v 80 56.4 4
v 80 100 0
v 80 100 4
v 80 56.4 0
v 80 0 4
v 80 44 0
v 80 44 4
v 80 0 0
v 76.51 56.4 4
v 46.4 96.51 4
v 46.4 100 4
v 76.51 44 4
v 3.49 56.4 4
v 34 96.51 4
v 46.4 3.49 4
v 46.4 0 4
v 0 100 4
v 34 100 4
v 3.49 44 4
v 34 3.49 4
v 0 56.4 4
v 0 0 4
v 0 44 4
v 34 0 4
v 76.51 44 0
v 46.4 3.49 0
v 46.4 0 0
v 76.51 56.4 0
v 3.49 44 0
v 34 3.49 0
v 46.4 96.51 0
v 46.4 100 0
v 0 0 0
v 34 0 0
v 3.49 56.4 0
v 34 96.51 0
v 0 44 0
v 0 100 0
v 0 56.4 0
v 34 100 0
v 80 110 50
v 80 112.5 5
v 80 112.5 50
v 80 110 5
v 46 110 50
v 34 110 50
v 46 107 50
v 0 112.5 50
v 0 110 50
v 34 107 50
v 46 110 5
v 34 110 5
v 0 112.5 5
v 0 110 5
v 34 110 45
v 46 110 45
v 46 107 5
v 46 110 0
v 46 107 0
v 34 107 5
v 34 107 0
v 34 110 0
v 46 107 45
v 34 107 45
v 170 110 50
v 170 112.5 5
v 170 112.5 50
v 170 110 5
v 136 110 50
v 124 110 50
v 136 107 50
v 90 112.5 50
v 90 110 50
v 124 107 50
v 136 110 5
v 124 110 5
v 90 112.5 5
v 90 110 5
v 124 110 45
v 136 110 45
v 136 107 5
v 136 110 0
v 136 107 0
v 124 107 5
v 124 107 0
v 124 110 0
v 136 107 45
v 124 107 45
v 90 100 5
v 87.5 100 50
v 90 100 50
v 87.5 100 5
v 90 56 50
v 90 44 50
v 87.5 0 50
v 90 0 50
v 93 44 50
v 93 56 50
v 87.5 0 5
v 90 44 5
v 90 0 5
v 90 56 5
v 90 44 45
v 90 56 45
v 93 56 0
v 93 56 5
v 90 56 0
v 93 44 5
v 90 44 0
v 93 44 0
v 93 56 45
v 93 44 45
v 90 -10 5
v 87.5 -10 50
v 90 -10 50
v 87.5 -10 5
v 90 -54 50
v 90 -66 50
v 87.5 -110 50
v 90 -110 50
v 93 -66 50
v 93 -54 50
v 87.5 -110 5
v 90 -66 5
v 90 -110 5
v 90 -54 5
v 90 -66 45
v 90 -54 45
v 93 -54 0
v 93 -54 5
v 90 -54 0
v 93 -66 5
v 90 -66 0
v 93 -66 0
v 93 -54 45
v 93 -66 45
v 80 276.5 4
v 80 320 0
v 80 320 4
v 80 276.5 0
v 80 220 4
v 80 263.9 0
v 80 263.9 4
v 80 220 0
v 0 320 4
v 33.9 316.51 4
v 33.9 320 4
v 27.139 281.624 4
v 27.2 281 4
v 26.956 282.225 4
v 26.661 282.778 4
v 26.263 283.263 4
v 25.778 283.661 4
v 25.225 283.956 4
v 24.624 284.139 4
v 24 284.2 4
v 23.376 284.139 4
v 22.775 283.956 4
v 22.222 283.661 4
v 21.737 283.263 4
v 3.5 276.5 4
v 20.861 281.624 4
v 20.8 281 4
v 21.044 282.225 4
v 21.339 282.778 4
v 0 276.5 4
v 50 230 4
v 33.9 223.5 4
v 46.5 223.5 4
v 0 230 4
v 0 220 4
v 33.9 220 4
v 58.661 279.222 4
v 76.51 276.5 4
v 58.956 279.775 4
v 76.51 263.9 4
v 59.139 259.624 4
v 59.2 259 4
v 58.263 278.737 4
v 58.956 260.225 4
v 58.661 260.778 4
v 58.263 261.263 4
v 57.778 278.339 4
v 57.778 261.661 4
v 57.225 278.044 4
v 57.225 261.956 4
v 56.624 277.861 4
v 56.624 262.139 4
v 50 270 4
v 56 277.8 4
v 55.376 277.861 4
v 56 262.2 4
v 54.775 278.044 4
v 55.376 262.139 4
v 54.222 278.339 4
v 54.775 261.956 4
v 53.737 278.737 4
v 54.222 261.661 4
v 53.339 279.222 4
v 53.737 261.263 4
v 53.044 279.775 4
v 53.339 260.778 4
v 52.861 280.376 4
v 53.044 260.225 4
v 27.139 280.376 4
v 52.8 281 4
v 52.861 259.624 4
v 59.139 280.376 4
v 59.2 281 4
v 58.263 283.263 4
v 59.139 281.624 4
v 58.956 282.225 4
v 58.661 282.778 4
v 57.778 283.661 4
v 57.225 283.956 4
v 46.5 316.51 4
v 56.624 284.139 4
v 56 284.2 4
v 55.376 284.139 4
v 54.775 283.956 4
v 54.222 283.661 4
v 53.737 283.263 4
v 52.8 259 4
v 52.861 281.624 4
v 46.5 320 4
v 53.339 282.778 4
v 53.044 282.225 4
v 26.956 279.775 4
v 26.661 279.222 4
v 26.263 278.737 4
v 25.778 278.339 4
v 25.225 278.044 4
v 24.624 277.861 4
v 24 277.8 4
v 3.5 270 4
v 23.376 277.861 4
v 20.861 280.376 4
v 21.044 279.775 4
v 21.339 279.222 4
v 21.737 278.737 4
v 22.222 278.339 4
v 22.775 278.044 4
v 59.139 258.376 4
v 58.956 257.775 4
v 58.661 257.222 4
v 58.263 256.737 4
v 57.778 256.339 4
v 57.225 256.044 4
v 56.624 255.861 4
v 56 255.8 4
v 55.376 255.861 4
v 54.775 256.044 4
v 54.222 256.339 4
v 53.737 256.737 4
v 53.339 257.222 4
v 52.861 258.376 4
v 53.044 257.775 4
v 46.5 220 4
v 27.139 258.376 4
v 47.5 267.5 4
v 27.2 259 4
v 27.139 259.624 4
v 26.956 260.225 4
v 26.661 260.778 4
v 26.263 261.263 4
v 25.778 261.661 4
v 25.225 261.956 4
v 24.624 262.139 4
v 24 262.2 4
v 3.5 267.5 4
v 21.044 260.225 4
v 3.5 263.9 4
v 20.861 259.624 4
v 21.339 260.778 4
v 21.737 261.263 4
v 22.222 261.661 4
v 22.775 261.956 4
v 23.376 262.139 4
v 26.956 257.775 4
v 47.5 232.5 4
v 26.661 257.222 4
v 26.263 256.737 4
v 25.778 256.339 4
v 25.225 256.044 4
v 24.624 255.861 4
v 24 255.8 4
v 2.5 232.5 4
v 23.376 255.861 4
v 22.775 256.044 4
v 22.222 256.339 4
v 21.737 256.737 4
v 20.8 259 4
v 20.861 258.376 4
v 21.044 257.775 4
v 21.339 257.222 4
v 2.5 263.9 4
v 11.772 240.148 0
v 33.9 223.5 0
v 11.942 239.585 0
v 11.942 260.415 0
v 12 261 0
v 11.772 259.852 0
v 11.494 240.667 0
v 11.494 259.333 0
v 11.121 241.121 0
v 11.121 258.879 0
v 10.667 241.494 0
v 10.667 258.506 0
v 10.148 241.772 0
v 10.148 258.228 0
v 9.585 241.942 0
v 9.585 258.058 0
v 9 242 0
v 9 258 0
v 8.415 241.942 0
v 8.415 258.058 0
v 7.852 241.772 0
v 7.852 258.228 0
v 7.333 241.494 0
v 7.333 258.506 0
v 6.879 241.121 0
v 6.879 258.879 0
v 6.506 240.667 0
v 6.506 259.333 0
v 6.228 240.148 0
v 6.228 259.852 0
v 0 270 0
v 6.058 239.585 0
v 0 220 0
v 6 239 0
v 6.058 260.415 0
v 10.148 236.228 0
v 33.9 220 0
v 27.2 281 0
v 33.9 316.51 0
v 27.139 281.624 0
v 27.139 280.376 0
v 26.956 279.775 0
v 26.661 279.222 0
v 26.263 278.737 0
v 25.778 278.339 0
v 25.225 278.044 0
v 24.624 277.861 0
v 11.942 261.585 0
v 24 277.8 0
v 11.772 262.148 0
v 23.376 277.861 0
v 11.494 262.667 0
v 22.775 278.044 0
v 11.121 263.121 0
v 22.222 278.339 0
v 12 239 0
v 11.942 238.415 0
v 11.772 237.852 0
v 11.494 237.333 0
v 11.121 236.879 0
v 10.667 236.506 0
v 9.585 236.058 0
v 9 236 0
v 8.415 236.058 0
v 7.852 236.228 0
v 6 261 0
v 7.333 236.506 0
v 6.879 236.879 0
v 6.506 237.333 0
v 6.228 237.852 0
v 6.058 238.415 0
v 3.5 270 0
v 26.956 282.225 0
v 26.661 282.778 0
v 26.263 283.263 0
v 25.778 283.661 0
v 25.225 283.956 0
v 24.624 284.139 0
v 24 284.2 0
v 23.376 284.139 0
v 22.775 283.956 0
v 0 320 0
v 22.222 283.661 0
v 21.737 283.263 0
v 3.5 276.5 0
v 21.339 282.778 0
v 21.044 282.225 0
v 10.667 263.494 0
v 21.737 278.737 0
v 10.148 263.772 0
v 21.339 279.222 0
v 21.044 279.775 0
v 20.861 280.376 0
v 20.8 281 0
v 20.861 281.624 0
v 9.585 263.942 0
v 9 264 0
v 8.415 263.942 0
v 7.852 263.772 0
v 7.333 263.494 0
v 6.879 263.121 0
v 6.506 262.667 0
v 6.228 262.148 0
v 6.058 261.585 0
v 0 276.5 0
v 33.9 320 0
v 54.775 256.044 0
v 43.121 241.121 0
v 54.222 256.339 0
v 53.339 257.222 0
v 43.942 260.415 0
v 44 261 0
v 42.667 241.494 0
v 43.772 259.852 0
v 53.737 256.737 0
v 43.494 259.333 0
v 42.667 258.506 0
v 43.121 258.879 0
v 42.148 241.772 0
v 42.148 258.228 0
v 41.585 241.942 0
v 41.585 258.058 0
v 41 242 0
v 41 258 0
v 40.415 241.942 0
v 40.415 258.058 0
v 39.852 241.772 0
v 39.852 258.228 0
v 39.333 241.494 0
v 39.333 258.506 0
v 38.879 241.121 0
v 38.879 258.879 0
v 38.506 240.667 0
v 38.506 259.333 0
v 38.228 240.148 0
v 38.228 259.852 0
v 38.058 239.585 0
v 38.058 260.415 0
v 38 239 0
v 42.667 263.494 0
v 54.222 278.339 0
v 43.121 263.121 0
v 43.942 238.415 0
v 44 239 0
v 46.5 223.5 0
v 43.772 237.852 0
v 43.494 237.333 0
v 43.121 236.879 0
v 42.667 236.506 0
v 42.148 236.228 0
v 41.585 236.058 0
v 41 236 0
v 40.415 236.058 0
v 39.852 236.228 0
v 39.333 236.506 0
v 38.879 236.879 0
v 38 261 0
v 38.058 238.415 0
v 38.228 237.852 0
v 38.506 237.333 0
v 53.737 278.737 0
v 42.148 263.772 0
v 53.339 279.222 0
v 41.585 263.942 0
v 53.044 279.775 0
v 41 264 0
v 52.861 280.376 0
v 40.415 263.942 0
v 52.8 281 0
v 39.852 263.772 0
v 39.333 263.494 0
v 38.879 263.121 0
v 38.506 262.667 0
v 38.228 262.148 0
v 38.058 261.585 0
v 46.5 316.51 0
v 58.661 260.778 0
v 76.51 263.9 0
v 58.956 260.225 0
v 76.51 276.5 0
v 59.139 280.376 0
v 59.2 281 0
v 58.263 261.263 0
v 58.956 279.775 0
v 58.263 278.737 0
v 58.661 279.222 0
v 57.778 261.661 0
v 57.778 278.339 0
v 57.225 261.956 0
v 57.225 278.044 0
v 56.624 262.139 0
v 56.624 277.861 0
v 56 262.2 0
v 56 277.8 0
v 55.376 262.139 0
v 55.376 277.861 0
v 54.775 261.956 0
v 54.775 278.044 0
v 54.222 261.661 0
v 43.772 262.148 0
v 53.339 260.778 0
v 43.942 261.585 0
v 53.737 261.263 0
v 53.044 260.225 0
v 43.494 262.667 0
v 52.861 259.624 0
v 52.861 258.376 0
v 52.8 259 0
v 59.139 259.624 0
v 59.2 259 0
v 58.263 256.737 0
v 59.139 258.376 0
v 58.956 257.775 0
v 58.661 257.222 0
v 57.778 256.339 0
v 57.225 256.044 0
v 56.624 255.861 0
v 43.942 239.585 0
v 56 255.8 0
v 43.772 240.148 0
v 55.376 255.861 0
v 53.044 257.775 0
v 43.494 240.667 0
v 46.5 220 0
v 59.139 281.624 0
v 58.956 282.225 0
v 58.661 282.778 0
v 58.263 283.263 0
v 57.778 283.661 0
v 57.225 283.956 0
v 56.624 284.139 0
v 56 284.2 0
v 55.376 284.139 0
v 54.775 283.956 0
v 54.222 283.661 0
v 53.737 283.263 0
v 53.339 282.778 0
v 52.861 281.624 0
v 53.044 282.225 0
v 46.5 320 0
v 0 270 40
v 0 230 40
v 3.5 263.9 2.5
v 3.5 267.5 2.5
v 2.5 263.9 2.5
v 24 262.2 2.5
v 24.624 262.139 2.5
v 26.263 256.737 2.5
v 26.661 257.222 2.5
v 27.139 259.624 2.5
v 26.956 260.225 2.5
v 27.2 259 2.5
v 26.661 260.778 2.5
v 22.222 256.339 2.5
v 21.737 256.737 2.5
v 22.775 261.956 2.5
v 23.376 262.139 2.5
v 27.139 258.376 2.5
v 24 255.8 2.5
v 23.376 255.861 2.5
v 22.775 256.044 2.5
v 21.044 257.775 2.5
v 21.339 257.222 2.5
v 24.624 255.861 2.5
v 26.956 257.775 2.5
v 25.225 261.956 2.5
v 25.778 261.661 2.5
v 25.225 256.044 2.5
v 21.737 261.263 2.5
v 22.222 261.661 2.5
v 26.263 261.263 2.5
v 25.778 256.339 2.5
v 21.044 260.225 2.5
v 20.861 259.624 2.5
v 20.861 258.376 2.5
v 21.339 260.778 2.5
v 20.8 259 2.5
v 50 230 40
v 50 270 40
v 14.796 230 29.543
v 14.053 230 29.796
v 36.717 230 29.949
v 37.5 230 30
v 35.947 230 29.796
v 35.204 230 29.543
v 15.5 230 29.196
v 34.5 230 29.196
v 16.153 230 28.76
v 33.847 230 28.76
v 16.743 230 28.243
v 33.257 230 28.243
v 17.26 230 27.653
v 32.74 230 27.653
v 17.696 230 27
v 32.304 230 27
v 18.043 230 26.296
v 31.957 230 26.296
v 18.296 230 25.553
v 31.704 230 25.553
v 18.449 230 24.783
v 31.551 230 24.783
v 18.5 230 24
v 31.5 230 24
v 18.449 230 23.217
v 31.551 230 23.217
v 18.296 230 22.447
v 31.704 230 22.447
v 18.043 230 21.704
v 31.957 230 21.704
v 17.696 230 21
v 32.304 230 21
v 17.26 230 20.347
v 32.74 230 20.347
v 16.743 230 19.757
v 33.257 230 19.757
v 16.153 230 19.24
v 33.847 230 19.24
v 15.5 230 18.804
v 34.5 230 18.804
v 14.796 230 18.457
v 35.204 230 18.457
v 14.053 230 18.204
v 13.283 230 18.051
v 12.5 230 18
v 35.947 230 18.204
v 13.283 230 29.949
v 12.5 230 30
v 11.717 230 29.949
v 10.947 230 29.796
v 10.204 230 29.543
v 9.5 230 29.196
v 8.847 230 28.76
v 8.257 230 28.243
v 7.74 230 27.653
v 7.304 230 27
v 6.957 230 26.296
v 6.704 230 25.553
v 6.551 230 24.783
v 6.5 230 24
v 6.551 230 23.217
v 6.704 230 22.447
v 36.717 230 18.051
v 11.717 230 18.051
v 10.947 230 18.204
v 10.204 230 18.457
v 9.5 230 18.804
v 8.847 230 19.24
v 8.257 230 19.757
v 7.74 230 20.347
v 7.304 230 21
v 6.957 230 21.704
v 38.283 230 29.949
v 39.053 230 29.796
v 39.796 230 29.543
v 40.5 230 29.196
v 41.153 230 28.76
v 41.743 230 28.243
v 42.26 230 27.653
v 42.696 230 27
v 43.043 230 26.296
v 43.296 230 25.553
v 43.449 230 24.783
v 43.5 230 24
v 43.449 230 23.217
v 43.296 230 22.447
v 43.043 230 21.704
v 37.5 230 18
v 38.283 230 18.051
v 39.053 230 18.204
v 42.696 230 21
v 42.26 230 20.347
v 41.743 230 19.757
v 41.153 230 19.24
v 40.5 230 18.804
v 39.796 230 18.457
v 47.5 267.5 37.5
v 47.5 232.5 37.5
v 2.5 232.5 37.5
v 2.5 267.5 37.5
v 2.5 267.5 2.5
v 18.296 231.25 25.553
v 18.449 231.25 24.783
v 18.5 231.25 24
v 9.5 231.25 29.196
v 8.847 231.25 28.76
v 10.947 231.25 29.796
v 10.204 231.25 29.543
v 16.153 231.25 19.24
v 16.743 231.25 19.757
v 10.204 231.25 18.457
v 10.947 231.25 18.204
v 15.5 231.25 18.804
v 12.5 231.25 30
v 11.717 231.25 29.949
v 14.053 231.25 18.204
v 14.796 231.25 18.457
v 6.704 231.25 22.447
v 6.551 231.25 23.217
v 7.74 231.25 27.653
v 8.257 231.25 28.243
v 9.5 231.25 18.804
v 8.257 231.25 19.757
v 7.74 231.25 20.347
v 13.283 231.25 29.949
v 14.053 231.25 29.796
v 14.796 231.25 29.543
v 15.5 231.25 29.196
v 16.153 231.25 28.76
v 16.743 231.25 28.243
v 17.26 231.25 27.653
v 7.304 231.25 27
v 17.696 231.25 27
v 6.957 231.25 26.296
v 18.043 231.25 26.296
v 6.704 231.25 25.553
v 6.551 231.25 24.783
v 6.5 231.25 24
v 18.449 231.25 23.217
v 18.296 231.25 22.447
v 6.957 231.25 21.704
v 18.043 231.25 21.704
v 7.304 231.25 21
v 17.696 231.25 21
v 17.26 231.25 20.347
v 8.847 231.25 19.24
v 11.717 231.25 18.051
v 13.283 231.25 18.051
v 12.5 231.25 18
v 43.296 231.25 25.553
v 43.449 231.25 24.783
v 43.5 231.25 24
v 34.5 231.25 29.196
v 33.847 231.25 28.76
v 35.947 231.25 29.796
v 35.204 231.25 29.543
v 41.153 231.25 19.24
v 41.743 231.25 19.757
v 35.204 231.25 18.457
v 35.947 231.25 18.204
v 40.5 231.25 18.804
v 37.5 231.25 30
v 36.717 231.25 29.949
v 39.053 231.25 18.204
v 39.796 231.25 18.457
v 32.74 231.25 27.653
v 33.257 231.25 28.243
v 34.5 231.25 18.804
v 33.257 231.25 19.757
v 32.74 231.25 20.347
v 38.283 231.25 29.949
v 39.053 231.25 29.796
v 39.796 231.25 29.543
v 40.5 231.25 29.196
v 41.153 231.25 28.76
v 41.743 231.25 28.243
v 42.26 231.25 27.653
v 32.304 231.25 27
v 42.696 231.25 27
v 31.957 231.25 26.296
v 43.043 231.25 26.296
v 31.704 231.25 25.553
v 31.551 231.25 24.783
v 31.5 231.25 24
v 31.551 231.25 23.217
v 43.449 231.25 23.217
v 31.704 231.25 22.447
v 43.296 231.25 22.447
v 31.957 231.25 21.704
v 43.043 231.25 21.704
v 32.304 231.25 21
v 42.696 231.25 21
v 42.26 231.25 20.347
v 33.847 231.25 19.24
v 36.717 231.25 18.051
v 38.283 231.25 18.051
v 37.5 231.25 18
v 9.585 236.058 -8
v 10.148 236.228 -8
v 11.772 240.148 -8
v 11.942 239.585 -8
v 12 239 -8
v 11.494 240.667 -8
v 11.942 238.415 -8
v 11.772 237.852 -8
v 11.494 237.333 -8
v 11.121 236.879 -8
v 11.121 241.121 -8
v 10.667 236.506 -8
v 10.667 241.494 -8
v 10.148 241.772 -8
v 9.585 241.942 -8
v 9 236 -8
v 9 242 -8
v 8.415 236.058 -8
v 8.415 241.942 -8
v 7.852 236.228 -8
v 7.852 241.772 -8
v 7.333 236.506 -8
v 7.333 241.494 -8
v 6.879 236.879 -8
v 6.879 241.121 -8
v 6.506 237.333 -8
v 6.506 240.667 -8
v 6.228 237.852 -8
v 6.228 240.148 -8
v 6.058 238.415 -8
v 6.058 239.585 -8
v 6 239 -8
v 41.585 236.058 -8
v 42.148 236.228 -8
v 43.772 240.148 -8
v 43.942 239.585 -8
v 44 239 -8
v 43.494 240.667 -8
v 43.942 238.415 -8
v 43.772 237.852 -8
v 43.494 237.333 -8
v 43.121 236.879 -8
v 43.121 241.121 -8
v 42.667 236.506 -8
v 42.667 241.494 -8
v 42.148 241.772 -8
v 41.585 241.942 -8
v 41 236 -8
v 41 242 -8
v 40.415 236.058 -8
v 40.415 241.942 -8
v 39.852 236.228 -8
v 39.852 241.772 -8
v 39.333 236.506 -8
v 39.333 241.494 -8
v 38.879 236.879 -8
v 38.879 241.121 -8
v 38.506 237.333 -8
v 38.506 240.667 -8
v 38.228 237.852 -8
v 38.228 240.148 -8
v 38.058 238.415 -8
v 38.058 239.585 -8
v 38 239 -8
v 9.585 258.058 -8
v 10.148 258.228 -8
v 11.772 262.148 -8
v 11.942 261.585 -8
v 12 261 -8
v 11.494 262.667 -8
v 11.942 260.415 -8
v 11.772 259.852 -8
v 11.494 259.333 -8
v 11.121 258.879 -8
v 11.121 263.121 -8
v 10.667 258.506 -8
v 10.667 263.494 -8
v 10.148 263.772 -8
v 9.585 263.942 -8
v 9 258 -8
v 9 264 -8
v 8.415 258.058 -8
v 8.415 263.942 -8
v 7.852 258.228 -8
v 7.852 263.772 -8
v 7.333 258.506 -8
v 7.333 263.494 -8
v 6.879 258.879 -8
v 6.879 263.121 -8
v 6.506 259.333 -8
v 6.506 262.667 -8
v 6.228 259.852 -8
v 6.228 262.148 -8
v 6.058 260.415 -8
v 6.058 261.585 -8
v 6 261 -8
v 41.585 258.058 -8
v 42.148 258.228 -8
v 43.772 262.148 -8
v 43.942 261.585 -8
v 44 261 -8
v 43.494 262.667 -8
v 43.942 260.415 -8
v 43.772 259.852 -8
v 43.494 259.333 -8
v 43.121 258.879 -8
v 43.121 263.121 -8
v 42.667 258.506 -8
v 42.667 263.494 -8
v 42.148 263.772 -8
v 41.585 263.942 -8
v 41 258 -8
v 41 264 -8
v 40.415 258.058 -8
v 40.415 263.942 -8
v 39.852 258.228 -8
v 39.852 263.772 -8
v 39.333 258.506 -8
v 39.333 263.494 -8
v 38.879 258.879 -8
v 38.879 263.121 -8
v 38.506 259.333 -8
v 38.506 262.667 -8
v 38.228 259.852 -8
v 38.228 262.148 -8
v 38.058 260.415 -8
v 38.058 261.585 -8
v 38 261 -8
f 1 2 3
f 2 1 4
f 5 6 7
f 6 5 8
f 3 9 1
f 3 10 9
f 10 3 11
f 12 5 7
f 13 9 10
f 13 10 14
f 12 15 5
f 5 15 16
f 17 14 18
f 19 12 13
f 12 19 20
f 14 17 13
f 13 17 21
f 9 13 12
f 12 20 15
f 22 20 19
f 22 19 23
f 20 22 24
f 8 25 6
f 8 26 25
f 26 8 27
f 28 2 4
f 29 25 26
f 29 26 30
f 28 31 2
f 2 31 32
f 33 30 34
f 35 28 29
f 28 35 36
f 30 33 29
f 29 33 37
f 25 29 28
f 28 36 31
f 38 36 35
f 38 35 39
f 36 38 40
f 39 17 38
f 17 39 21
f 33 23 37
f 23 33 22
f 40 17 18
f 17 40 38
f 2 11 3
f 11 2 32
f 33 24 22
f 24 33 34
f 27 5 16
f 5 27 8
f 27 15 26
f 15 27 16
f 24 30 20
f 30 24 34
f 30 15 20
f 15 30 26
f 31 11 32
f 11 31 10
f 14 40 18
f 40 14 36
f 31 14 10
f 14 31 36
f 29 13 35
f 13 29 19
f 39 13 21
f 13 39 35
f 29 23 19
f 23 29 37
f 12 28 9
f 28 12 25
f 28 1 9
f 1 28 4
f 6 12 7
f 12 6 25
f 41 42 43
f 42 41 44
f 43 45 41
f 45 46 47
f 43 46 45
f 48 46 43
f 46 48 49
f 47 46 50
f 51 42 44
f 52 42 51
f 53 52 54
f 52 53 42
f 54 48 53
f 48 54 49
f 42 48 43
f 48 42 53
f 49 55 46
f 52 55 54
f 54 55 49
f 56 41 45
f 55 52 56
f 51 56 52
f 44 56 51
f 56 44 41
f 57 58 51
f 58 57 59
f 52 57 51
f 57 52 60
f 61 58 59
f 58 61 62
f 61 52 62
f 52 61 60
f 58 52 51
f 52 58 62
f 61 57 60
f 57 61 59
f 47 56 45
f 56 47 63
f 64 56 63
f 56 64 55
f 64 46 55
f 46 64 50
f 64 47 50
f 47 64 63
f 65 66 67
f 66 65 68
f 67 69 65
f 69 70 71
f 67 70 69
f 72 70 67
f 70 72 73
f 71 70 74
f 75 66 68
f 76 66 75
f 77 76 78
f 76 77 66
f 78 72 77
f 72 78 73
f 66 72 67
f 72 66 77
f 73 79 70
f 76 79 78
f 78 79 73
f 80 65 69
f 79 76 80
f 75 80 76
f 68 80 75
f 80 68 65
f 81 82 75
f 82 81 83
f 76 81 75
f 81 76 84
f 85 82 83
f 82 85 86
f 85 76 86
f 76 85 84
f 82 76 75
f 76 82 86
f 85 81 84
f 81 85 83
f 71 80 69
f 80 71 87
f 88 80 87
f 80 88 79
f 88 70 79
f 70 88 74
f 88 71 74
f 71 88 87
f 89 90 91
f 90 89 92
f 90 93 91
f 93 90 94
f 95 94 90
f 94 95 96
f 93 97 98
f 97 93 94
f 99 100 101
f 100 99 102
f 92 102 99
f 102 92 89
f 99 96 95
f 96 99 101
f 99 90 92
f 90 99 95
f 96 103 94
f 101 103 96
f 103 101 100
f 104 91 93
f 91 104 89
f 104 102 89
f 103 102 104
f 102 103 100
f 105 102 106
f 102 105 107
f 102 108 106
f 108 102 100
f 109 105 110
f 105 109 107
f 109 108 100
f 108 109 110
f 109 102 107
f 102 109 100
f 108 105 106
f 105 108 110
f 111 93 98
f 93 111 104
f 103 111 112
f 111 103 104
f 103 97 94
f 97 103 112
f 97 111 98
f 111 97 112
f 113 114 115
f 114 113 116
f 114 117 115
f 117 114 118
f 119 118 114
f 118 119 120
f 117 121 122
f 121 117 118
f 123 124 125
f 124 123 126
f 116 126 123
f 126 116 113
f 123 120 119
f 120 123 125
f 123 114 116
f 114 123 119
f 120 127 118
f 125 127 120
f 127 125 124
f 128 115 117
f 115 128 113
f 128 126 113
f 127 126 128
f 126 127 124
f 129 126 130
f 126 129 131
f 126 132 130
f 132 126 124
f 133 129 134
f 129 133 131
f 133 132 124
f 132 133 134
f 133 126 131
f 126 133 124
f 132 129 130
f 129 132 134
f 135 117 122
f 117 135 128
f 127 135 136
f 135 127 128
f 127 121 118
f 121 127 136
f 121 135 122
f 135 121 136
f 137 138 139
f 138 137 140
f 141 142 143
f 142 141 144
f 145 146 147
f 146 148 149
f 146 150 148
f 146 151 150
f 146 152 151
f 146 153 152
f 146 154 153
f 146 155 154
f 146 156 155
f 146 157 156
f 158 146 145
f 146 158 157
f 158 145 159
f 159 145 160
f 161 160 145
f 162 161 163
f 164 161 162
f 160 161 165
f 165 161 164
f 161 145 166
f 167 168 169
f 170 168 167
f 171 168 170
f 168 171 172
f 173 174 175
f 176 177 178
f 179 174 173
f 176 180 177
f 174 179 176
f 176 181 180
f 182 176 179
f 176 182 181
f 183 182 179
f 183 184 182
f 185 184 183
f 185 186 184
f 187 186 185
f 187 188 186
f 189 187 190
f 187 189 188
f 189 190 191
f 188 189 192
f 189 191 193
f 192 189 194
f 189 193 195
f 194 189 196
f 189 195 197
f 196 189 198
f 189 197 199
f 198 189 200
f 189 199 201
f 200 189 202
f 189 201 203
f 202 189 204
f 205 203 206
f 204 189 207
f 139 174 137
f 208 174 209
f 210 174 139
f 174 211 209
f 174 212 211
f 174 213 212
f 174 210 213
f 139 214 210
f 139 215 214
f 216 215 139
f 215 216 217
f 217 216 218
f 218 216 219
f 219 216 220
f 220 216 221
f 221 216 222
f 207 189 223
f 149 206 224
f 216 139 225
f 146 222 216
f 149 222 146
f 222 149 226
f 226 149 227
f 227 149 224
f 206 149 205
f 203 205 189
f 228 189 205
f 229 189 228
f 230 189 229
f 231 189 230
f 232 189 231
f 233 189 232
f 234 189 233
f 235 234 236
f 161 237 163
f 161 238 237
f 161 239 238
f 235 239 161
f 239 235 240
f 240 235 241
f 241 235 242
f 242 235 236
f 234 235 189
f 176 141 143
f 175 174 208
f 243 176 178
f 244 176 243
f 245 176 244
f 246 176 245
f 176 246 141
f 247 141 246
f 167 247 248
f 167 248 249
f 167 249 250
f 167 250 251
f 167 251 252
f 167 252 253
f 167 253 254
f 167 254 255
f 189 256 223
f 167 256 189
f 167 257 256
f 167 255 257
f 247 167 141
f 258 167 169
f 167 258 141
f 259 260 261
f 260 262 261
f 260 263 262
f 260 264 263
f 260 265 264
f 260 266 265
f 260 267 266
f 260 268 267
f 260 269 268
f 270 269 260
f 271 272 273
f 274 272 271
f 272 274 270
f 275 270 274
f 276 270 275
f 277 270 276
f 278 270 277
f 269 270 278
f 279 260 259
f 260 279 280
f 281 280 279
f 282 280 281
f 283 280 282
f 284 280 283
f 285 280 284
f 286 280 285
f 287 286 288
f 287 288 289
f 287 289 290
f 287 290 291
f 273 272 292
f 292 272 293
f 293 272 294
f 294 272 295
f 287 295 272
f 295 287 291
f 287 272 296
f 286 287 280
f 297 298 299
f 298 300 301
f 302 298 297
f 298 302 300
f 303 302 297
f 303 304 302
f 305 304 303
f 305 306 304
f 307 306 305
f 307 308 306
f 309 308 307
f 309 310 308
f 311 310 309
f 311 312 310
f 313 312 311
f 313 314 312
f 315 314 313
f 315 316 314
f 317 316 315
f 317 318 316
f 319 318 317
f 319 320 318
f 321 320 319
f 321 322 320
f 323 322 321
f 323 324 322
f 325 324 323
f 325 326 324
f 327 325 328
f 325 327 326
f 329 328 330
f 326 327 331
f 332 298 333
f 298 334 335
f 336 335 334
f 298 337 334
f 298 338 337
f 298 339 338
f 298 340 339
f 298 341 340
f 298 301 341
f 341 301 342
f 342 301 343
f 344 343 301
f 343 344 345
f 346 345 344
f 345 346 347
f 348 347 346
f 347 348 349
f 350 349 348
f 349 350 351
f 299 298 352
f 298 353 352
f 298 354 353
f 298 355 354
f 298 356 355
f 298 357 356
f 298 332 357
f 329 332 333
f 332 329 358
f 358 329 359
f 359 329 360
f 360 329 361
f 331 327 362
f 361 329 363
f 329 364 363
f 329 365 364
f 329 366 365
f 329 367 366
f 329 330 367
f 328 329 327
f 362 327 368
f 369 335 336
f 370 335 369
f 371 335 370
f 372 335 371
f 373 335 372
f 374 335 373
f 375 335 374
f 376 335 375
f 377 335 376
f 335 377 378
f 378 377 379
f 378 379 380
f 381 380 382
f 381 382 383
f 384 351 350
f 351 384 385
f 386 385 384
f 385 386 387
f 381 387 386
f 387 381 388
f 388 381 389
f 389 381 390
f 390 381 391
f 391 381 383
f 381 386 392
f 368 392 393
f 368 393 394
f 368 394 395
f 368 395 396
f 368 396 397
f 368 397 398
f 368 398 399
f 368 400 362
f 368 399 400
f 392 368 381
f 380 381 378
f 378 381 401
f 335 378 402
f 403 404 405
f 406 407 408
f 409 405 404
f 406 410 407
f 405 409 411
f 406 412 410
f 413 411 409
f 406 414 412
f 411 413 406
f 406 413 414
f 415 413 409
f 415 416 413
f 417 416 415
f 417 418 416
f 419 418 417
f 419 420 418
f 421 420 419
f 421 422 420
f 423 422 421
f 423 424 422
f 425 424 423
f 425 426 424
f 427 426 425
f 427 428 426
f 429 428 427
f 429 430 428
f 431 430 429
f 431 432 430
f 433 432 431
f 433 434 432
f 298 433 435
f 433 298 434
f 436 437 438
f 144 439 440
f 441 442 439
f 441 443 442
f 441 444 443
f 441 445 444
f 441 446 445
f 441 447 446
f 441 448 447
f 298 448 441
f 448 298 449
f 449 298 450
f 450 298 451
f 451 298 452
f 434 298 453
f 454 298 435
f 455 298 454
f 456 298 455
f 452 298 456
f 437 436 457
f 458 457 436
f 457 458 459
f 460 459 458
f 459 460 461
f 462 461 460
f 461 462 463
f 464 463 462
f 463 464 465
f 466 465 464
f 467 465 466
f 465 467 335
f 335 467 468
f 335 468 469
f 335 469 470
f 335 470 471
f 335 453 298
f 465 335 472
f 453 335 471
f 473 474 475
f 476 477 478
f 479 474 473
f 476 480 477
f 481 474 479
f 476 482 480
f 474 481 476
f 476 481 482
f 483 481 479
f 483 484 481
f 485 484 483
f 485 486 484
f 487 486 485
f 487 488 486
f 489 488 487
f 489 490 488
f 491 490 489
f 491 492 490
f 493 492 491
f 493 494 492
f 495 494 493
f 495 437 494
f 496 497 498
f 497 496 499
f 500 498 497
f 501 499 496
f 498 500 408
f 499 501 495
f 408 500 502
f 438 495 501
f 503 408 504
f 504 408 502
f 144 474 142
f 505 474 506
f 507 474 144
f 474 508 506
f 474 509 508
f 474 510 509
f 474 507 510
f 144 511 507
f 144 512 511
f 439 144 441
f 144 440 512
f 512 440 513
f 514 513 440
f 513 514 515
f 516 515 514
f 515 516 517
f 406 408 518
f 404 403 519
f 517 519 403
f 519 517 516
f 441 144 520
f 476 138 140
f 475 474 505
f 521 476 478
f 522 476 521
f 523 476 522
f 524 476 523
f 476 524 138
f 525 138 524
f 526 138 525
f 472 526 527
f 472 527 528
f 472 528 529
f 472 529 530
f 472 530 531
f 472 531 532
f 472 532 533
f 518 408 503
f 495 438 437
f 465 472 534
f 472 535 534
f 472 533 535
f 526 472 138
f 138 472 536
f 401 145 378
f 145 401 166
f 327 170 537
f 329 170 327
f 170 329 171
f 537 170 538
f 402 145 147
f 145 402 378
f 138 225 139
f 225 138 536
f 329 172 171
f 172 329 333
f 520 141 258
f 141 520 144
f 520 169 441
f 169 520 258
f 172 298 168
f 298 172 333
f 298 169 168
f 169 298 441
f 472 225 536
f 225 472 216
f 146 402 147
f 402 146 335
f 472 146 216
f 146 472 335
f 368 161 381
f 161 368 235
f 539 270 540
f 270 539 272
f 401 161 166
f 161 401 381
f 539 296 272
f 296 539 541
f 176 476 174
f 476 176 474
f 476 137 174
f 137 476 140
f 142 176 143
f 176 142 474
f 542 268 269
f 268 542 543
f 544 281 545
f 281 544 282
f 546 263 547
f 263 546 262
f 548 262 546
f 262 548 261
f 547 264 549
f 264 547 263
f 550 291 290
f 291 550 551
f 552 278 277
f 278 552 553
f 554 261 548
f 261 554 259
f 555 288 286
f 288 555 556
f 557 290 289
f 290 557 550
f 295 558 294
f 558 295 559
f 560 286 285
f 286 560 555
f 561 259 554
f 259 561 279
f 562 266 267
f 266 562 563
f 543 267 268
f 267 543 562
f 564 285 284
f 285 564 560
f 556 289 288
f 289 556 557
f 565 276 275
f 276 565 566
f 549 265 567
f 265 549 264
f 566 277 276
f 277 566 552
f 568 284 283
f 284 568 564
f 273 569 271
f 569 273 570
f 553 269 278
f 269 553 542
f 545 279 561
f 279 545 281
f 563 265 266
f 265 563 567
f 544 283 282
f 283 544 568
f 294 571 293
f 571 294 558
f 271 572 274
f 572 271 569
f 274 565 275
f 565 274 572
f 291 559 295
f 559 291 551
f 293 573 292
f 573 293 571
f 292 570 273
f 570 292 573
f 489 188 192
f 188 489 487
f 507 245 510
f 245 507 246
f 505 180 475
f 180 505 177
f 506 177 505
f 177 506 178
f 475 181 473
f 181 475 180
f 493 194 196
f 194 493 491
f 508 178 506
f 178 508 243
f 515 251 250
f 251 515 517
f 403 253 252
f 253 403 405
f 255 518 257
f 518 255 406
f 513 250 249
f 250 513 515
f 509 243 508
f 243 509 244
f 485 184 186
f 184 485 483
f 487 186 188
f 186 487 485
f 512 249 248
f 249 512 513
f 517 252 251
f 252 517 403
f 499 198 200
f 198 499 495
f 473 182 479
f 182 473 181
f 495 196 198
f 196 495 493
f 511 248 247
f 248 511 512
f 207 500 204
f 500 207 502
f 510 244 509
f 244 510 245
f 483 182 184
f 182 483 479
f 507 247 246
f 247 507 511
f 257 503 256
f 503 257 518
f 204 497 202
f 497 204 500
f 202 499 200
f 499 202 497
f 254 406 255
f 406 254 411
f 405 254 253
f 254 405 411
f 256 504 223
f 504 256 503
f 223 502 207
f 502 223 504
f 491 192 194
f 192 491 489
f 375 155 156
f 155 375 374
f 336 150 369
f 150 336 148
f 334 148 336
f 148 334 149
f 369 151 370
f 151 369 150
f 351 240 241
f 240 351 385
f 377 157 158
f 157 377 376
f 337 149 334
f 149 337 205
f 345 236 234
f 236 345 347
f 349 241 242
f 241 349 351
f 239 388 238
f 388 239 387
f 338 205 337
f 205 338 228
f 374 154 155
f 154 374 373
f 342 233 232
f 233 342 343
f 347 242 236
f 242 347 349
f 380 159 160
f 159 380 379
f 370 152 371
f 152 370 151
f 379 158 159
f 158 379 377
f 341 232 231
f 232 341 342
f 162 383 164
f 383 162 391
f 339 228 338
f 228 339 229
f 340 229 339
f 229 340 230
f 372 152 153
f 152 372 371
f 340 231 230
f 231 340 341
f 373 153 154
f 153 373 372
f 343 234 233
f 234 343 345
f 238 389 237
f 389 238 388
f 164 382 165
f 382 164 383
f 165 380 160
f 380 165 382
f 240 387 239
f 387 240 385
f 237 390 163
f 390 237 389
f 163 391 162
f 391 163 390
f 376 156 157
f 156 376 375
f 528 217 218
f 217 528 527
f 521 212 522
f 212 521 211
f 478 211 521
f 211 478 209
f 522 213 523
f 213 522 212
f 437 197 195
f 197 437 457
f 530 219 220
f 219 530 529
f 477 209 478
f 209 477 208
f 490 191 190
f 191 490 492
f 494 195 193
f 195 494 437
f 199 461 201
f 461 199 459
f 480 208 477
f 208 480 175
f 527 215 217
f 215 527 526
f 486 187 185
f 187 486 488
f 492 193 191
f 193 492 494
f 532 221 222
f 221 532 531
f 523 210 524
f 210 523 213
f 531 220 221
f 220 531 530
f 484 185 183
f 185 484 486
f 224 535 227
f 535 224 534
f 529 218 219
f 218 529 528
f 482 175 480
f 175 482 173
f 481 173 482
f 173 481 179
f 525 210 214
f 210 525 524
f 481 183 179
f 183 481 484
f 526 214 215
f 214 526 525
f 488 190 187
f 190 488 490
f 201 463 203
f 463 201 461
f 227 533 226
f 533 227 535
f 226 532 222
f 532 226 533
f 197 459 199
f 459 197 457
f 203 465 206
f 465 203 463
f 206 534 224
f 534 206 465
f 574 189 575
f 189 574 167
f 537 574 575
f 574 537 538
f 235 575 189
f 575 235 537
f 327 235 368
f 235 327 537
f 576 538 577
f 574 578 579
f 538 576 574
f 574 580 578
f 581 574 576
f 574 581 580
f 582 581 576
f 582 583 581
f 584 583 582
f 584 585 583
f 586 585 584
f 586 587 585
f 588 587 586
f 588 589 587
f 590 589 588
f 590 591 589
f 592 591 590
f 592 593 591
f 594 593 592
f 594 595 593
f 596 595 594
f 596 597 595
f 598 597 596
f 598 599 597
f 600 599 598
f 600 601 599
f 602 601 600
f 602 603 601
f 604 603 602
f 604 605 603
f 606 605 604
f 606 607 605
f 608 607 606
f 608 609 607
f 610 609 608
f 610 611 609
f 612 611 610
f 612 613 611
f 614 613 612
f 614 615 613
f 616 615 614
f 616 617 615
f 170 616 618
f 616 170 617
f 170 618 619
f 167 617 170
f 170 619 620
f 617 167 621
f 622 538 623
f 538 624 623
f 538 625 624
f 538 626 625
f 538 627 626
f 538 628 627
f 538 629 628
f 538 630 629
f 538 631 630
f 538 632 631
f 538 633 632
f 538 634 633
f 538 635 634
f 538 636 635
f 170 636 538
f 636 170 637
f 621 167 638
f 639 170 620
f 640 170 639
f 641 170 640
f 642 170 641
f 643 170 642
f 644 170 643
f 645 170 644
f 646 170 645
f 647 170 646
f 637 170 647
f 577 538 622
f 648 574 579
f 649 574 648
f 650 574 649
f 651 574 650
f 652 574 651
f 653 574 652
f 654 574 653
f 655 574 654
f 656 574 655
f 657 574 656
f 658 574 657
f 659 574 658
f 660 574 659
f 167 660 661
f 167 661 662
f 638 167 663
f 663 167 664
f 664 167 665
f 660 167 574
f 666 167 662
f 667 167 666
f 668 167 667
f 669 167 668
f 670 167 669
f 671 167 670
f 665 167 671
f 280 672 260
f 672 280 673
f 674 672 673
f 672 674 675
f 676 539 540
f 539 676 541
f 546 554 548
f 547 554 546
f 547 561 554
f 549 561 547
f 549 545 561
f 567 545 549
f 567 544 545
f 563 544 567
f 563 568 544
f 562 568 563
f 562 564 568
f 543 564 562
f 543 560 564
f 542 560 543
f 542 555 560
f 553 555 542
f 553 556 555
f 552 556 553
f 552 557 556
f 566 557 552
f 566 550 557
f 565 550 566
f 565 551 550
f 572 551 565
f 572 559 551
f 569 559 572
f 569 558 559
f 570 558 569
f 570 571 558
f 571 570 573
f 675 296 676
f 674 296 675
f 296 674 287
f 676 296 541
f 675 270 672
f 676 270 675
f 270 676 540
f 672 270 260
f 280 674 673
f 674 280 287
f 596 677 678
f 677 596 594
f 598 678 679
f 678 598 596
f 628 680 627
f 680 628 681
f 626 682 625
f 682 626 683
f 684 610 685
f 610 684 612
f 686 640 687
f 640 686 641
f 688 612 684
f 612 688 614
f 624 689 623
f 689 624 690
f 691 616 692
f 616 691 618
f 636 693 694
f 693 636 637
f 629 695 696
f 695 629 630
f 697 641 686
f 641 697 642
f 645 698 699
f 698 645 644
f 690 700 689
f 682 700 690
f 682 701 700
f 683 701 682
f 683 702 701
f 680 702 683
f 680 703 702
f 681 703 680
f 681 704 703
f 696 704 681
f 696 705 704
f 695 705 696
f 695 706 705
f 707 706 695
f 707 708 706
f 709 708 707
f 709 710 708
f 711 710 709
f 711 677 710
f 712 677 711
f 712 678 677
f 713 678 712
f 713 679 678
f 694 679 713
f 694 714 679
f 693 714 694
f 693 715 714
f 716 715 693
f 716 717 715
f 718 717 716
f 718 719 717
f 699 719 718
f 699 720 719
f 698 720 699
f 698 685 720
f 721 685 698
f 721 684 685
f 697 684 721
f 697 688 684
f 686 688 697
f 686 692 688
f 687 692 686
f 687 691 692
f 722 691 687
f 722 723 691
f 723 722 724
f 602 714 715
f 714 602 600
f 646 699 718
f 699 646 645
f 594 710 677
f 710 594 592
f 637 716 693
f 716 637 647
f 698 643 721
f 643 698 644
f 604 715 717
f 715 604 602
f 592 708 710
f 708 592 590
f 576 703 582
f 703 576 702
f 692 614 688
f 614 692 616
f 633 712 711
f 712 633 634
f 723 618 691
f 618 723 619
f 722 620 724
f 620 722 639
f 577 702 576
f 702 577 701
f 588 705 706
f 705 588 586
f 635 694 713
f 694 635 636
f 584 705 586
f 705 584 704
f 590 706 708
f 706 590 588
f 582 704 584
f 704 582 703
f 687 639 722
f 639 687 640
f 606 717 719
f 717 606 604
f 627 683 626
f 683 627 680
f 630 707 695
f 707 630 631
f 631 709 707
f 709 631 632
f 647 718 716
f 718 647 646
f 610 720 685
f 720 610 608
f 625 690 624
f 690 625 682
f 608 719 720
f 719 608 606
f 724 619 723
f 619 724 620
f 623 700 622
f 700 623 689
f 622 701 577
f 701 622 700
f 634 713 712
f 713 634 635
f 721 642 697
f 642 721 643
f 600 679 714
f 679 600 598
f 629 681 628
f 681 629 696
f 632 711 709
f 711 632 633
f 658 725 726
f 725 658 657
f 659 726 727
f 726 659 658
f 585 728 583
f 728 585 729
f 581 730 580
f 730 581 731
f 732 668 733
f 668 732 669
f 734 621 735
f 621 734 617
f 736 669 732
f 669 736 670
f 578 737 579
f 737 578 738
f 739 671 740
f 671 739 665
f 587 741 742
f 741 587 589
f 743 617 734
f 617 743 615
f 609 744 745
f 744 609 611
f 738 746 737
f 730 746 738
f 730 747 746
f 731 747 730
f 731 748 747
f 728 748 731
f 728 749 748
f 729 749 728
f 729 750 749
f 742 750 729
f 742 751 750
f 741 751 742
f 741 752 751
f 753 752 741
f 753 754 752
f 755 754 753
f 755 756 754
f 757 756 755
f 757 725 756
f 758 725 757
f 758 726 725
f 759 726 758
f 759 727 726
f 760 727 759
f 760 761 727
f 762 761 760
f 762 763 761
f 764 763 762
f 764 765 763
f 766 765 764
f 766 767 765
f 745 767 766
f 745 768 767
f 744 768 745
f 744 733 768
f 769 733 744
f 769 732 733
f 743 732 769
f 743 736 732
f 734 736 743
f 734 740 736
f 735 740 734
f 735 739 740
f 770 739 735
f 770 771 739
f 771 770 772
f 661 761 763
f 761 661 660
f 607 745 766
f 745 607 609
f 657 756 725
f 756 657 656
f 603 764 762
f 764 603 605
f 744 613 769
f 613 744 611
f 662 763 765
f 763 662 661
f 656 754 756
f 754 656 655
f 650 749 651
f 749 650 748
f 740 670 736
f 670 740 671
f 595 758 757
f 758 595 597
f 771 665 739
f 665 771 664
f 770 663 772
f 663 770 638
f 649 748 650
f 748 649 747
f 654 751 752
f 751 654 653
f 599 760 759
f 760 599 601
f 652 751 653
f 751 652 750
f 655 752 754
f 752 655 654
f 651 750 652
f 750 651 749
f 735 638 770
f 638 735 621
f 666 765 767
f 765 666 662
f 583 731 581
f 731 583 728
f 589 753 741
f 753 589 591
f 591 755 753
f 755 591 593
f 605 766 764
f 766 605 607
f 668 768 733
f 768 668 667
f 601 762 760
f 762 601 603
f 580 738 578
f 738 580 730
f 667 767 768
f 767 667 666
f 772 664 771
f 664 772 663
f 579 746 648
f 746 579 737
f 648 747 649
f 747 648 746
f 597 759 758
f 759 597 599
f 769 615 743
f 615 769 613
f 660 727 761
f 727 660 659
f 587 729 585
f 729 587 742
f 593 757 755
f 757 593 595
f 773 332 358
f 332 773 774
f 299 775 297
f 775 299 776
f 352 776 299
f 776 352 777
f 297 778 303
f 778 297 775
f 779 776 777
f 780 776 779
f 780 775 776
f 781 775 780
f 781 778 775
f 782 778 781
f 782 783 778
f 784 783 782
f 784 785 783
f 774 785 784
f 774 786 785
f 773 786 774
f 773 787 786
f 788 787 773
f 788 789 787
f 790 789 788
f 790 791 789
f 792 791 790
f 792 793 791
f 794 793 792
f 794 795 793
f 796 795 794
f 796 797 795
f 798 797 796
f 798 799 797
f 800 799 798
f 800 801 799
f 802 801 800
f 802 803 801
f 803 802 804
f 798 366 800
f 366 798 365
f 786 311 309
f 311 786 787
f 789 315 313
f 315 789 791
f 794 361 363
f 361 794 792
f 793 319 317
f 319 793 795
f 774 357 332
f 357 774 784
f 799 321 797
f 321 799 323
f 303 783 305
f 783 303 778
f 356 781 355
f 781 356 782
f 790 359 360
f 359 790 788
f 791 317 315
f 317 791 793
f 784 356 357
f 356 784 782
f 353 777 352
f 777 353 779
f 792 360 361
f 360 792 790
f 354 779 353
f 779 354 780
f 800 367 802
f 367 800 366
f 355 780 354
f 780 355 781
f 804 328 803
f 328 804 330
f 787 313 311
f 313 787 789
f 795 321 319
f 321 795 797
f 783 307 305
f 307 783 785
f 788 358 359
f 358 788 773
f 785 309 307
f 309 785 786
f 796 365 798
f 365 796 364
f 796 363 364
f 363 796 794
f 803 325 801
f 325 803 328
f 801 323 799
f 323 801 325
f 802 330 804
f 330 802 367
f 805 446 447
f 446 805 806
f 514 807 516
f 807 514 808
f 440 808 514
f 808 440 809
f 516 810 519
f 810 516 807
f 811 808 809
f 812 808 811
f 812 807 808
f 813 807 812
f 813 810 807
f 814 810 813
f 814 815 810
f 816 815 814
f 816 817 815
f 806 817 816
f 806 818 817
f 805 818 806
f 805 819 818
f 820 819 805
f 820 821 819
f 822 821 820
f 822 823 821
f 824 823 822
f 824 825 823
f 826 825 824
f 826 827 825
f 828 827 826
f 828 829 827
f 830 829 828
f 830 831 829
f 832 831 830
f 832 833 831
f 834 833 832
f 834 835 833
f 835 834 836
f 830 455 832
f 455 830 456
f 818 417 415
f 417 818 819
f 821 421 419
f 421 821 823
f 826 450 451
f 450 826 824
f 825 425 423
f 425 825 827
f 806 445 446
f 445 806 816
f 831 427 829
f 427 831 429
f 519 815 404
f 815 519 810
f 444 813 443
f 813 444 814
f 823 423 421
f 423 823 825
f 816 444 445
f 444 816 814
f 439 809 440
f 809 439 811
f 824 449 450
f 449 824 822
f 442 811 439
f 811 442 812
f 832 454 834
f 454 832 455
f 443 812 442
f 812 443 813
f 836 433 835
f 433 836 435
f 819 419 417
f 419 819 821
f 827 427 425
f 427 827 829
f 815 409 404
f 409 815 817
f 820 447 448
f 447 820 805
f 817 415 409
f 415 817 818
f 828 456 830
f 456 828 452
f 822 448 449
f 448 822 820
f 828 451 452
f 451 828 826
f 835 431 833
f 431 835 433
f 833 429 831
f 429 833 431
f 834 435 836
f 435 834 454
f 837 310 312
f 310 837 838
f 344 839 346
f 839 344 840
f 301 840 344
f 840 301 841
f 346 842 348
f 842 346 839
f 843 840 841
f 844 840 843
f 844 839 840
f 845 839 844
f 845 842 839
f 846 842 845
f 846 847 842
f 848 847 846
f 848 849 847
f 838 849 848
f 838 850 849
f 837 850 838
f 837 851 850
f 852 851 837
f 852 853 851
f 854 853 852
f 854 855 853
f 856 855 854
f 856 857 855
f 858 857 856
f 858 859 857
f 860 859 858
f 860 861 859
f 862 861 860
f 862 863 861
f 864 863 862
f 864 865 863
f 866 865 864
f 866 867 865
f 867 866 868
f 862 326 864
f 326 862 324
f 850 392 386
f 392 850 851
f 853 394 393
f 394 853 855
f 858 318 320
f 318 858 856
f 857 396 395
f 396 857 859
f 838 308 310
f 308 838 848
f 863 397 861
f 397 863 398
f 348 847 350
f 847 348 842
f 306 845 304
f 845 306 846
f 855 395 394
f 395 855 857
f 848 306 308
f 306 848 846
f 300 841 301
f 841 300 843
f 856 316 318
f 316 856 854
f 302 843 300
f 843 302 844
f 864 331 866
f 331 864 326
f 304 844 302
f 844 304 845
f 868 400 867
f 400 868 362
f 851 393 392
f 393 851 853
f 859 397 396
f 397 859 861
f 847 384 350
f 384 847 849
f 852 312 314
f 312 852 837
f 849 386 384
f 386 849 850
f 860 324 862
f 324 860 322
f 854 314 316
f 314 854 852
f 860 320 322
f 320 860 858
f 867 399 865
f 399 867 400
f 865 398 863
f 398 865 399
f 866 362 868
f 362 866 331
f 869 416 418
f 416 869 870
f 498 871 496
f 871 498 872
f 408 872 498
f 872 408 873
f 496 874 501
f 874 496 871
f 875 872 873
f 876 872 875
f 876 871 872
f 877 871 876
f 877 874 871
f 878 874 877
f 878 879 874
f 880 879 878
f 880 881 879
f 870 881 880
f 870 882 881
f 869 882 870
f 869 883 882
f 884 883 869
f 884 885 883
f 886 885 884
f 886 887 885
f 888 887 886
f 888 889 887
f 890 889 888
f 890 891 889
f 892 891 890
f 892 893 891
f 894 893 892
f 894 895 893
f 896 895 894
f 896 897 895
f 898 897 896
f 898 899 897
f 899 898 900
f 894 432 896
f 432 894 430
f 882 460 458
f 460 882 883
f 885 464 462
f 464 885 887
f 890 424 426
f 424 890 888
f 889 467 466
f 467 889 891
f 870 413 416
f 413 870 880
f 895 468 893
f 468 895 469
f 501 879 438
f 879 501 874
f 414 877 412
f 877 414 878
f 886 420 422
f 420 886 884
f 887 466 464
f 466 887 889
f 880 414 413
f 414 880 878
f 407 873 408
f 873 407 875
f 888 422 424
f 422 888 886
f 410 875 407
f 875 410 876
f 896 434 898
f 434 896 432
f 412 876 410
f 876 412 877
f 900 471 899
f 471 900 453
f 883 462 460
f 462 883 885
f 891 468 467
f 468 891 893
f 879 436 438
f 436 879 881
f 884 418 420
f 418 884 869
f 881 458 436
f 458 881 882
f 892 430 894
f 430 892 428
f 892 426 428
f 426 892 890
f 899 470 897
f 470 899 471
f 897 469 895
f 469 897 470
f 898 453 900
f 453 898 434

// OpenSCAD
// =========================
// Projeto Caelum - Montagem modular com encaixes
// Versão revisada: paredes agora têm TABS SUPERIORES
// =========================

// -------------------- CONFIG --------------------
wall = 2.5;
clearance = 0.4;
snap_gap = 0.2;

// Dimensões do corpo
body_x = 80;
body_y = 100;
body_z = 50;

// Cabeça
head_x = 50;
head_y = 40;
head_z = 40;

// Encaixes
tab_w = 12;
tab_h = 5;
tab_d = 3;

// Pinos da cabeça
peg_d = 6;
peg_h = 8;

// modos
view_mode =6;
// -------------------- HELPERS --------------------
function slot_len_for_wall_x() = body_x - 2*wall;
function slot_len_for_wall_y() = body_y - 2*wall;

// -------------------- BASE --------------------
module base_plate() {

    base_thickness = 4;
    pocket_depth = tab_h + 0.5;

    difference() {
        cube([body_x, body_y, base_thickness]);

        // front slot
        translate([wall + (slot_len_for_wall_x() - tab_w)/2, -0.01, 0])
            cube([tab_w + clearance, tab_d + 0.5, pocket_depth + 0.1]);

        // back slot
        translate([wall + (slot_len_for_wall_x() - tab_w)/2, body_y - (tab_d + 0.5) + 0.01, 0])
            cube([tab_w + clearance, tab_d + 0.5, pocket_depth + 0.1]);

        // left slot
        translate([-0.01, wall + (slot_len_for_wall_y() - tab_w)/2, 0])
            cube([tab_d + 0.5, tab_w + clearance, pocket_depth + 0.1]);

        // right slot
        translate([body_x - (tab_d + 0.5) + 0.01, wall + (slot_len_for_wall_y() - tab_w)/2, 0])
            cube([tab_d + 0.5, tab_w + clearance, pocket_depth + 0.1]);
    }
}

// -------------------- WALL FRONT/BACK --------------------
module wall_front_back() {

    height = body_z;
    width = body_x;
    thickness = wall;

    difference() {
        union() {
            // Corpo
            translate([0,0,tab_h])
                cube([width, thickness, height - tab_h]);

            // TAB inferior
            translate([(width - tab_w)/2, -tab_d, 0])
                cube([tab_w, tab_d, tab_h]);

            // TAB superior  (NOVO)
            translate([(width - tab_w)/2, -tab_d, height - tab_h])
                cube([tab_w, tab_d, tab_h]);
        }
    }
}

// -------------------- WALL LEFT/RIGHT --------------------
module wall_left_right() {

    height = body_z;
    width = body_y;
    thickness = wall;

    difference() {
        union() {
            translate([0,0,tab_h])
                cube([width, thickness, height - tab_h]);

            // TAB inferior
            translate([(width - tab_w)/2, -tab_d, 0])
                cube([tab_w, tab_d, tab_h]);

            // TAB superior (NOVO)
            translate([(width - tab_w)/2, -tab_d, height - tab_h])
                cube([tab_w, tab_d, tab_h]);
        }
    }
}

// -------------------- TOP PLATE --------------------
module top_plate() {

    top_thickness = 4;
    r_slot_len = tab_w + clearance + snap_gap;
    r_slot_depth = tab_d + 0.5;

    head_origin_x = (body_x - head_x) / 2;
    head_origin_y = (body_y - head_y) / 2;

    difference() {
        cube([body_x, body_y, top_thickness]);

        // front slot
        translate([wall + (slot_len_for_wall_x() - tab_w)/2 - snap_gap/2, 0, -0.01])
            cube([r_slot_len, r_slot_depth, top_thickness + 0.02]);

        // back slot
        translate([wall + (slot_len_for_wall_x() - tab_w)/2 - snap_gap/2,
                   body_y - r_slot_depth + 0.01, -0.01])
            cube([r_slot_len, r_slot_depth, top_thickness + 0.02]);

        // left slot
        translate([0,
                   wall + (slot_len_for_wall_y() - tab_w)/2 - snap_gap/2, -0.01])
            cube([r_slot_depth, r_slot_len, top_thickness + 0.02]);

        // right slot
        translate([body_x - r_slot_depth + 0.01,
                   wall + (slot_len_for_wall_y() - tab_w)/2 - snap_gap/2, -0.01])
            cube([r_slot_depth, r_slot_len, top_thickness + 0.02]);

        // ----------------------
        // FUROS PARA A CABEÇA
        // ----------------------

        hole_d = peg_d + clearance;
        hole_depth = peg_h + 1;
        inset = 6;

        hx1 = head_origin_x + inset + peg_d/2;
        hy1 = head_origin_y + inset + peg_d/2;

        hx2 = head_origin_x + head_x - inset - peg_d/2;
        hy2 = head_origin_y + inset + peg_d/2;

        hx3 = head_origin_x + inset + peg_d/2;
        hy3 = head_origin_y + head_y - inset - peg_d/2;

        hx4 = head_origin_x + head_x - inset - peg_d/2;
        hy4 = head_origin_y + head_y - inset - peg_d/2;

        translate([hx1, hy1, -0.01]) cylinder(h=hole_depth, r=hole_d/2, $fn=32);
        translate([hx2, hy2, -0.01]) cylinder(h=hole_depth, r=hole_d/2, $fn=32);
        translate([hx3, hy3, -0.01]) cylinder(h=hole_depth, r=hole_d/2, $fn=32);
        translate([hx4, hy4, -0.01]) cylinder(h=hole_depth, r=hole_d/2, $fn=32);
    }
}

// -------------------- HEAD --------------------
module head_unit() {

    head_wall = 2.5;

    difference() {
        cube([head_x, head_y, head_z]);

        translate([head_wall, head_wall, head_wall])
            cube([head_x - 2*head_wall, head_y - 2*head_wall, head_z - 2*head_wall]);

        eye_r = 6;

        // Olho esquerdo
        translate([head_x*0.25, head_wall/2, head_z*0.6])
            rotate([90,0,0]) cylinder(h=head_y+3, r=eye_r, $fn=48);

        // Olho direito
        translate([head_x*0.75, head_wall/2, head_z*0.6])

            rotate([90,0,0]) cylinder(h=head_y+3, r=eye_r, $fn=48);
    }

    inset = 6;

    translate([inset + peg_d/2, inset + peg_d/2, -peg_h])
        cylinder(h=peg_h, r=peg_d/2, $fn=32);

    translate([head_x - inset - peg_d/2, inset + peg_d/2, -peg_h])
        cylinder(h=peg_h, r=peg_d/2, $fn=32);

    translate([inset + peg_d/2, head_y - inset - peg_d/2, -peg_h])
        cylinder(h=peg_h, r=peg_d/2, $fn=32);

    translate([head_x - inset - peg_d/2, head_y - inset - peg_d/2, -peg_h])
        cylinder(h=peg_h, r=peg_d/2, $fn=32);
}

// -------------------- ASSEMBLY --------------------
module assembly() {
    base_plate();

    translate([0,-wall,4]) wall_front_back();
    translate([0,body_y-wall+wall,4]) wall_front_back();

    translate([-wall,0,4]) rotate([0,0,90]) wall_left_right();
    translate([body_x-wall+wall,0,4]) rotate([0,0,90]) wall_left_right();

    top_z = 4 + body_z;

    translate([0,0,top_z]) top_plate();

    translate([(body_x-head_x)/2, (body_y-head_y)/2, top_z]) head_unit();
}

// -------------------- EXPLODED --------------------
module exploded() {
    gap = 10;

    translate([0,0,0]) base_plate();
    translate([0, body_y + gap, 0]) wall_front_back();
    translate([body_x + gap, body_y + gap, 0]) wall_front_back();

    translate([body_x + gap, 0, 0]) rotate([0,0,90]) wall_left_right();
    translate([body_x + gap, -body_y - gap, 0]) rotate([0,0,90]) wall_left_right();

    translate([0, 2*(body_y + gap), 0]) top_plate();
    translate([0, 2*(body_y + gap) + 10, 0]) head_unit();
}

// -------------------- VIEW MODES --------------------
if (view_mode == 0) assembly();
if (view_mode == 1) base_plate();
if (view_mode == 2) wall_front_back();
if (view_mode == 3) rotate([0,0,90]) wall_left_right();
if (view_mode == 4) top_plate();
if (view_mode == 5) head_unit();
if (view_mode == 6) exploded();
